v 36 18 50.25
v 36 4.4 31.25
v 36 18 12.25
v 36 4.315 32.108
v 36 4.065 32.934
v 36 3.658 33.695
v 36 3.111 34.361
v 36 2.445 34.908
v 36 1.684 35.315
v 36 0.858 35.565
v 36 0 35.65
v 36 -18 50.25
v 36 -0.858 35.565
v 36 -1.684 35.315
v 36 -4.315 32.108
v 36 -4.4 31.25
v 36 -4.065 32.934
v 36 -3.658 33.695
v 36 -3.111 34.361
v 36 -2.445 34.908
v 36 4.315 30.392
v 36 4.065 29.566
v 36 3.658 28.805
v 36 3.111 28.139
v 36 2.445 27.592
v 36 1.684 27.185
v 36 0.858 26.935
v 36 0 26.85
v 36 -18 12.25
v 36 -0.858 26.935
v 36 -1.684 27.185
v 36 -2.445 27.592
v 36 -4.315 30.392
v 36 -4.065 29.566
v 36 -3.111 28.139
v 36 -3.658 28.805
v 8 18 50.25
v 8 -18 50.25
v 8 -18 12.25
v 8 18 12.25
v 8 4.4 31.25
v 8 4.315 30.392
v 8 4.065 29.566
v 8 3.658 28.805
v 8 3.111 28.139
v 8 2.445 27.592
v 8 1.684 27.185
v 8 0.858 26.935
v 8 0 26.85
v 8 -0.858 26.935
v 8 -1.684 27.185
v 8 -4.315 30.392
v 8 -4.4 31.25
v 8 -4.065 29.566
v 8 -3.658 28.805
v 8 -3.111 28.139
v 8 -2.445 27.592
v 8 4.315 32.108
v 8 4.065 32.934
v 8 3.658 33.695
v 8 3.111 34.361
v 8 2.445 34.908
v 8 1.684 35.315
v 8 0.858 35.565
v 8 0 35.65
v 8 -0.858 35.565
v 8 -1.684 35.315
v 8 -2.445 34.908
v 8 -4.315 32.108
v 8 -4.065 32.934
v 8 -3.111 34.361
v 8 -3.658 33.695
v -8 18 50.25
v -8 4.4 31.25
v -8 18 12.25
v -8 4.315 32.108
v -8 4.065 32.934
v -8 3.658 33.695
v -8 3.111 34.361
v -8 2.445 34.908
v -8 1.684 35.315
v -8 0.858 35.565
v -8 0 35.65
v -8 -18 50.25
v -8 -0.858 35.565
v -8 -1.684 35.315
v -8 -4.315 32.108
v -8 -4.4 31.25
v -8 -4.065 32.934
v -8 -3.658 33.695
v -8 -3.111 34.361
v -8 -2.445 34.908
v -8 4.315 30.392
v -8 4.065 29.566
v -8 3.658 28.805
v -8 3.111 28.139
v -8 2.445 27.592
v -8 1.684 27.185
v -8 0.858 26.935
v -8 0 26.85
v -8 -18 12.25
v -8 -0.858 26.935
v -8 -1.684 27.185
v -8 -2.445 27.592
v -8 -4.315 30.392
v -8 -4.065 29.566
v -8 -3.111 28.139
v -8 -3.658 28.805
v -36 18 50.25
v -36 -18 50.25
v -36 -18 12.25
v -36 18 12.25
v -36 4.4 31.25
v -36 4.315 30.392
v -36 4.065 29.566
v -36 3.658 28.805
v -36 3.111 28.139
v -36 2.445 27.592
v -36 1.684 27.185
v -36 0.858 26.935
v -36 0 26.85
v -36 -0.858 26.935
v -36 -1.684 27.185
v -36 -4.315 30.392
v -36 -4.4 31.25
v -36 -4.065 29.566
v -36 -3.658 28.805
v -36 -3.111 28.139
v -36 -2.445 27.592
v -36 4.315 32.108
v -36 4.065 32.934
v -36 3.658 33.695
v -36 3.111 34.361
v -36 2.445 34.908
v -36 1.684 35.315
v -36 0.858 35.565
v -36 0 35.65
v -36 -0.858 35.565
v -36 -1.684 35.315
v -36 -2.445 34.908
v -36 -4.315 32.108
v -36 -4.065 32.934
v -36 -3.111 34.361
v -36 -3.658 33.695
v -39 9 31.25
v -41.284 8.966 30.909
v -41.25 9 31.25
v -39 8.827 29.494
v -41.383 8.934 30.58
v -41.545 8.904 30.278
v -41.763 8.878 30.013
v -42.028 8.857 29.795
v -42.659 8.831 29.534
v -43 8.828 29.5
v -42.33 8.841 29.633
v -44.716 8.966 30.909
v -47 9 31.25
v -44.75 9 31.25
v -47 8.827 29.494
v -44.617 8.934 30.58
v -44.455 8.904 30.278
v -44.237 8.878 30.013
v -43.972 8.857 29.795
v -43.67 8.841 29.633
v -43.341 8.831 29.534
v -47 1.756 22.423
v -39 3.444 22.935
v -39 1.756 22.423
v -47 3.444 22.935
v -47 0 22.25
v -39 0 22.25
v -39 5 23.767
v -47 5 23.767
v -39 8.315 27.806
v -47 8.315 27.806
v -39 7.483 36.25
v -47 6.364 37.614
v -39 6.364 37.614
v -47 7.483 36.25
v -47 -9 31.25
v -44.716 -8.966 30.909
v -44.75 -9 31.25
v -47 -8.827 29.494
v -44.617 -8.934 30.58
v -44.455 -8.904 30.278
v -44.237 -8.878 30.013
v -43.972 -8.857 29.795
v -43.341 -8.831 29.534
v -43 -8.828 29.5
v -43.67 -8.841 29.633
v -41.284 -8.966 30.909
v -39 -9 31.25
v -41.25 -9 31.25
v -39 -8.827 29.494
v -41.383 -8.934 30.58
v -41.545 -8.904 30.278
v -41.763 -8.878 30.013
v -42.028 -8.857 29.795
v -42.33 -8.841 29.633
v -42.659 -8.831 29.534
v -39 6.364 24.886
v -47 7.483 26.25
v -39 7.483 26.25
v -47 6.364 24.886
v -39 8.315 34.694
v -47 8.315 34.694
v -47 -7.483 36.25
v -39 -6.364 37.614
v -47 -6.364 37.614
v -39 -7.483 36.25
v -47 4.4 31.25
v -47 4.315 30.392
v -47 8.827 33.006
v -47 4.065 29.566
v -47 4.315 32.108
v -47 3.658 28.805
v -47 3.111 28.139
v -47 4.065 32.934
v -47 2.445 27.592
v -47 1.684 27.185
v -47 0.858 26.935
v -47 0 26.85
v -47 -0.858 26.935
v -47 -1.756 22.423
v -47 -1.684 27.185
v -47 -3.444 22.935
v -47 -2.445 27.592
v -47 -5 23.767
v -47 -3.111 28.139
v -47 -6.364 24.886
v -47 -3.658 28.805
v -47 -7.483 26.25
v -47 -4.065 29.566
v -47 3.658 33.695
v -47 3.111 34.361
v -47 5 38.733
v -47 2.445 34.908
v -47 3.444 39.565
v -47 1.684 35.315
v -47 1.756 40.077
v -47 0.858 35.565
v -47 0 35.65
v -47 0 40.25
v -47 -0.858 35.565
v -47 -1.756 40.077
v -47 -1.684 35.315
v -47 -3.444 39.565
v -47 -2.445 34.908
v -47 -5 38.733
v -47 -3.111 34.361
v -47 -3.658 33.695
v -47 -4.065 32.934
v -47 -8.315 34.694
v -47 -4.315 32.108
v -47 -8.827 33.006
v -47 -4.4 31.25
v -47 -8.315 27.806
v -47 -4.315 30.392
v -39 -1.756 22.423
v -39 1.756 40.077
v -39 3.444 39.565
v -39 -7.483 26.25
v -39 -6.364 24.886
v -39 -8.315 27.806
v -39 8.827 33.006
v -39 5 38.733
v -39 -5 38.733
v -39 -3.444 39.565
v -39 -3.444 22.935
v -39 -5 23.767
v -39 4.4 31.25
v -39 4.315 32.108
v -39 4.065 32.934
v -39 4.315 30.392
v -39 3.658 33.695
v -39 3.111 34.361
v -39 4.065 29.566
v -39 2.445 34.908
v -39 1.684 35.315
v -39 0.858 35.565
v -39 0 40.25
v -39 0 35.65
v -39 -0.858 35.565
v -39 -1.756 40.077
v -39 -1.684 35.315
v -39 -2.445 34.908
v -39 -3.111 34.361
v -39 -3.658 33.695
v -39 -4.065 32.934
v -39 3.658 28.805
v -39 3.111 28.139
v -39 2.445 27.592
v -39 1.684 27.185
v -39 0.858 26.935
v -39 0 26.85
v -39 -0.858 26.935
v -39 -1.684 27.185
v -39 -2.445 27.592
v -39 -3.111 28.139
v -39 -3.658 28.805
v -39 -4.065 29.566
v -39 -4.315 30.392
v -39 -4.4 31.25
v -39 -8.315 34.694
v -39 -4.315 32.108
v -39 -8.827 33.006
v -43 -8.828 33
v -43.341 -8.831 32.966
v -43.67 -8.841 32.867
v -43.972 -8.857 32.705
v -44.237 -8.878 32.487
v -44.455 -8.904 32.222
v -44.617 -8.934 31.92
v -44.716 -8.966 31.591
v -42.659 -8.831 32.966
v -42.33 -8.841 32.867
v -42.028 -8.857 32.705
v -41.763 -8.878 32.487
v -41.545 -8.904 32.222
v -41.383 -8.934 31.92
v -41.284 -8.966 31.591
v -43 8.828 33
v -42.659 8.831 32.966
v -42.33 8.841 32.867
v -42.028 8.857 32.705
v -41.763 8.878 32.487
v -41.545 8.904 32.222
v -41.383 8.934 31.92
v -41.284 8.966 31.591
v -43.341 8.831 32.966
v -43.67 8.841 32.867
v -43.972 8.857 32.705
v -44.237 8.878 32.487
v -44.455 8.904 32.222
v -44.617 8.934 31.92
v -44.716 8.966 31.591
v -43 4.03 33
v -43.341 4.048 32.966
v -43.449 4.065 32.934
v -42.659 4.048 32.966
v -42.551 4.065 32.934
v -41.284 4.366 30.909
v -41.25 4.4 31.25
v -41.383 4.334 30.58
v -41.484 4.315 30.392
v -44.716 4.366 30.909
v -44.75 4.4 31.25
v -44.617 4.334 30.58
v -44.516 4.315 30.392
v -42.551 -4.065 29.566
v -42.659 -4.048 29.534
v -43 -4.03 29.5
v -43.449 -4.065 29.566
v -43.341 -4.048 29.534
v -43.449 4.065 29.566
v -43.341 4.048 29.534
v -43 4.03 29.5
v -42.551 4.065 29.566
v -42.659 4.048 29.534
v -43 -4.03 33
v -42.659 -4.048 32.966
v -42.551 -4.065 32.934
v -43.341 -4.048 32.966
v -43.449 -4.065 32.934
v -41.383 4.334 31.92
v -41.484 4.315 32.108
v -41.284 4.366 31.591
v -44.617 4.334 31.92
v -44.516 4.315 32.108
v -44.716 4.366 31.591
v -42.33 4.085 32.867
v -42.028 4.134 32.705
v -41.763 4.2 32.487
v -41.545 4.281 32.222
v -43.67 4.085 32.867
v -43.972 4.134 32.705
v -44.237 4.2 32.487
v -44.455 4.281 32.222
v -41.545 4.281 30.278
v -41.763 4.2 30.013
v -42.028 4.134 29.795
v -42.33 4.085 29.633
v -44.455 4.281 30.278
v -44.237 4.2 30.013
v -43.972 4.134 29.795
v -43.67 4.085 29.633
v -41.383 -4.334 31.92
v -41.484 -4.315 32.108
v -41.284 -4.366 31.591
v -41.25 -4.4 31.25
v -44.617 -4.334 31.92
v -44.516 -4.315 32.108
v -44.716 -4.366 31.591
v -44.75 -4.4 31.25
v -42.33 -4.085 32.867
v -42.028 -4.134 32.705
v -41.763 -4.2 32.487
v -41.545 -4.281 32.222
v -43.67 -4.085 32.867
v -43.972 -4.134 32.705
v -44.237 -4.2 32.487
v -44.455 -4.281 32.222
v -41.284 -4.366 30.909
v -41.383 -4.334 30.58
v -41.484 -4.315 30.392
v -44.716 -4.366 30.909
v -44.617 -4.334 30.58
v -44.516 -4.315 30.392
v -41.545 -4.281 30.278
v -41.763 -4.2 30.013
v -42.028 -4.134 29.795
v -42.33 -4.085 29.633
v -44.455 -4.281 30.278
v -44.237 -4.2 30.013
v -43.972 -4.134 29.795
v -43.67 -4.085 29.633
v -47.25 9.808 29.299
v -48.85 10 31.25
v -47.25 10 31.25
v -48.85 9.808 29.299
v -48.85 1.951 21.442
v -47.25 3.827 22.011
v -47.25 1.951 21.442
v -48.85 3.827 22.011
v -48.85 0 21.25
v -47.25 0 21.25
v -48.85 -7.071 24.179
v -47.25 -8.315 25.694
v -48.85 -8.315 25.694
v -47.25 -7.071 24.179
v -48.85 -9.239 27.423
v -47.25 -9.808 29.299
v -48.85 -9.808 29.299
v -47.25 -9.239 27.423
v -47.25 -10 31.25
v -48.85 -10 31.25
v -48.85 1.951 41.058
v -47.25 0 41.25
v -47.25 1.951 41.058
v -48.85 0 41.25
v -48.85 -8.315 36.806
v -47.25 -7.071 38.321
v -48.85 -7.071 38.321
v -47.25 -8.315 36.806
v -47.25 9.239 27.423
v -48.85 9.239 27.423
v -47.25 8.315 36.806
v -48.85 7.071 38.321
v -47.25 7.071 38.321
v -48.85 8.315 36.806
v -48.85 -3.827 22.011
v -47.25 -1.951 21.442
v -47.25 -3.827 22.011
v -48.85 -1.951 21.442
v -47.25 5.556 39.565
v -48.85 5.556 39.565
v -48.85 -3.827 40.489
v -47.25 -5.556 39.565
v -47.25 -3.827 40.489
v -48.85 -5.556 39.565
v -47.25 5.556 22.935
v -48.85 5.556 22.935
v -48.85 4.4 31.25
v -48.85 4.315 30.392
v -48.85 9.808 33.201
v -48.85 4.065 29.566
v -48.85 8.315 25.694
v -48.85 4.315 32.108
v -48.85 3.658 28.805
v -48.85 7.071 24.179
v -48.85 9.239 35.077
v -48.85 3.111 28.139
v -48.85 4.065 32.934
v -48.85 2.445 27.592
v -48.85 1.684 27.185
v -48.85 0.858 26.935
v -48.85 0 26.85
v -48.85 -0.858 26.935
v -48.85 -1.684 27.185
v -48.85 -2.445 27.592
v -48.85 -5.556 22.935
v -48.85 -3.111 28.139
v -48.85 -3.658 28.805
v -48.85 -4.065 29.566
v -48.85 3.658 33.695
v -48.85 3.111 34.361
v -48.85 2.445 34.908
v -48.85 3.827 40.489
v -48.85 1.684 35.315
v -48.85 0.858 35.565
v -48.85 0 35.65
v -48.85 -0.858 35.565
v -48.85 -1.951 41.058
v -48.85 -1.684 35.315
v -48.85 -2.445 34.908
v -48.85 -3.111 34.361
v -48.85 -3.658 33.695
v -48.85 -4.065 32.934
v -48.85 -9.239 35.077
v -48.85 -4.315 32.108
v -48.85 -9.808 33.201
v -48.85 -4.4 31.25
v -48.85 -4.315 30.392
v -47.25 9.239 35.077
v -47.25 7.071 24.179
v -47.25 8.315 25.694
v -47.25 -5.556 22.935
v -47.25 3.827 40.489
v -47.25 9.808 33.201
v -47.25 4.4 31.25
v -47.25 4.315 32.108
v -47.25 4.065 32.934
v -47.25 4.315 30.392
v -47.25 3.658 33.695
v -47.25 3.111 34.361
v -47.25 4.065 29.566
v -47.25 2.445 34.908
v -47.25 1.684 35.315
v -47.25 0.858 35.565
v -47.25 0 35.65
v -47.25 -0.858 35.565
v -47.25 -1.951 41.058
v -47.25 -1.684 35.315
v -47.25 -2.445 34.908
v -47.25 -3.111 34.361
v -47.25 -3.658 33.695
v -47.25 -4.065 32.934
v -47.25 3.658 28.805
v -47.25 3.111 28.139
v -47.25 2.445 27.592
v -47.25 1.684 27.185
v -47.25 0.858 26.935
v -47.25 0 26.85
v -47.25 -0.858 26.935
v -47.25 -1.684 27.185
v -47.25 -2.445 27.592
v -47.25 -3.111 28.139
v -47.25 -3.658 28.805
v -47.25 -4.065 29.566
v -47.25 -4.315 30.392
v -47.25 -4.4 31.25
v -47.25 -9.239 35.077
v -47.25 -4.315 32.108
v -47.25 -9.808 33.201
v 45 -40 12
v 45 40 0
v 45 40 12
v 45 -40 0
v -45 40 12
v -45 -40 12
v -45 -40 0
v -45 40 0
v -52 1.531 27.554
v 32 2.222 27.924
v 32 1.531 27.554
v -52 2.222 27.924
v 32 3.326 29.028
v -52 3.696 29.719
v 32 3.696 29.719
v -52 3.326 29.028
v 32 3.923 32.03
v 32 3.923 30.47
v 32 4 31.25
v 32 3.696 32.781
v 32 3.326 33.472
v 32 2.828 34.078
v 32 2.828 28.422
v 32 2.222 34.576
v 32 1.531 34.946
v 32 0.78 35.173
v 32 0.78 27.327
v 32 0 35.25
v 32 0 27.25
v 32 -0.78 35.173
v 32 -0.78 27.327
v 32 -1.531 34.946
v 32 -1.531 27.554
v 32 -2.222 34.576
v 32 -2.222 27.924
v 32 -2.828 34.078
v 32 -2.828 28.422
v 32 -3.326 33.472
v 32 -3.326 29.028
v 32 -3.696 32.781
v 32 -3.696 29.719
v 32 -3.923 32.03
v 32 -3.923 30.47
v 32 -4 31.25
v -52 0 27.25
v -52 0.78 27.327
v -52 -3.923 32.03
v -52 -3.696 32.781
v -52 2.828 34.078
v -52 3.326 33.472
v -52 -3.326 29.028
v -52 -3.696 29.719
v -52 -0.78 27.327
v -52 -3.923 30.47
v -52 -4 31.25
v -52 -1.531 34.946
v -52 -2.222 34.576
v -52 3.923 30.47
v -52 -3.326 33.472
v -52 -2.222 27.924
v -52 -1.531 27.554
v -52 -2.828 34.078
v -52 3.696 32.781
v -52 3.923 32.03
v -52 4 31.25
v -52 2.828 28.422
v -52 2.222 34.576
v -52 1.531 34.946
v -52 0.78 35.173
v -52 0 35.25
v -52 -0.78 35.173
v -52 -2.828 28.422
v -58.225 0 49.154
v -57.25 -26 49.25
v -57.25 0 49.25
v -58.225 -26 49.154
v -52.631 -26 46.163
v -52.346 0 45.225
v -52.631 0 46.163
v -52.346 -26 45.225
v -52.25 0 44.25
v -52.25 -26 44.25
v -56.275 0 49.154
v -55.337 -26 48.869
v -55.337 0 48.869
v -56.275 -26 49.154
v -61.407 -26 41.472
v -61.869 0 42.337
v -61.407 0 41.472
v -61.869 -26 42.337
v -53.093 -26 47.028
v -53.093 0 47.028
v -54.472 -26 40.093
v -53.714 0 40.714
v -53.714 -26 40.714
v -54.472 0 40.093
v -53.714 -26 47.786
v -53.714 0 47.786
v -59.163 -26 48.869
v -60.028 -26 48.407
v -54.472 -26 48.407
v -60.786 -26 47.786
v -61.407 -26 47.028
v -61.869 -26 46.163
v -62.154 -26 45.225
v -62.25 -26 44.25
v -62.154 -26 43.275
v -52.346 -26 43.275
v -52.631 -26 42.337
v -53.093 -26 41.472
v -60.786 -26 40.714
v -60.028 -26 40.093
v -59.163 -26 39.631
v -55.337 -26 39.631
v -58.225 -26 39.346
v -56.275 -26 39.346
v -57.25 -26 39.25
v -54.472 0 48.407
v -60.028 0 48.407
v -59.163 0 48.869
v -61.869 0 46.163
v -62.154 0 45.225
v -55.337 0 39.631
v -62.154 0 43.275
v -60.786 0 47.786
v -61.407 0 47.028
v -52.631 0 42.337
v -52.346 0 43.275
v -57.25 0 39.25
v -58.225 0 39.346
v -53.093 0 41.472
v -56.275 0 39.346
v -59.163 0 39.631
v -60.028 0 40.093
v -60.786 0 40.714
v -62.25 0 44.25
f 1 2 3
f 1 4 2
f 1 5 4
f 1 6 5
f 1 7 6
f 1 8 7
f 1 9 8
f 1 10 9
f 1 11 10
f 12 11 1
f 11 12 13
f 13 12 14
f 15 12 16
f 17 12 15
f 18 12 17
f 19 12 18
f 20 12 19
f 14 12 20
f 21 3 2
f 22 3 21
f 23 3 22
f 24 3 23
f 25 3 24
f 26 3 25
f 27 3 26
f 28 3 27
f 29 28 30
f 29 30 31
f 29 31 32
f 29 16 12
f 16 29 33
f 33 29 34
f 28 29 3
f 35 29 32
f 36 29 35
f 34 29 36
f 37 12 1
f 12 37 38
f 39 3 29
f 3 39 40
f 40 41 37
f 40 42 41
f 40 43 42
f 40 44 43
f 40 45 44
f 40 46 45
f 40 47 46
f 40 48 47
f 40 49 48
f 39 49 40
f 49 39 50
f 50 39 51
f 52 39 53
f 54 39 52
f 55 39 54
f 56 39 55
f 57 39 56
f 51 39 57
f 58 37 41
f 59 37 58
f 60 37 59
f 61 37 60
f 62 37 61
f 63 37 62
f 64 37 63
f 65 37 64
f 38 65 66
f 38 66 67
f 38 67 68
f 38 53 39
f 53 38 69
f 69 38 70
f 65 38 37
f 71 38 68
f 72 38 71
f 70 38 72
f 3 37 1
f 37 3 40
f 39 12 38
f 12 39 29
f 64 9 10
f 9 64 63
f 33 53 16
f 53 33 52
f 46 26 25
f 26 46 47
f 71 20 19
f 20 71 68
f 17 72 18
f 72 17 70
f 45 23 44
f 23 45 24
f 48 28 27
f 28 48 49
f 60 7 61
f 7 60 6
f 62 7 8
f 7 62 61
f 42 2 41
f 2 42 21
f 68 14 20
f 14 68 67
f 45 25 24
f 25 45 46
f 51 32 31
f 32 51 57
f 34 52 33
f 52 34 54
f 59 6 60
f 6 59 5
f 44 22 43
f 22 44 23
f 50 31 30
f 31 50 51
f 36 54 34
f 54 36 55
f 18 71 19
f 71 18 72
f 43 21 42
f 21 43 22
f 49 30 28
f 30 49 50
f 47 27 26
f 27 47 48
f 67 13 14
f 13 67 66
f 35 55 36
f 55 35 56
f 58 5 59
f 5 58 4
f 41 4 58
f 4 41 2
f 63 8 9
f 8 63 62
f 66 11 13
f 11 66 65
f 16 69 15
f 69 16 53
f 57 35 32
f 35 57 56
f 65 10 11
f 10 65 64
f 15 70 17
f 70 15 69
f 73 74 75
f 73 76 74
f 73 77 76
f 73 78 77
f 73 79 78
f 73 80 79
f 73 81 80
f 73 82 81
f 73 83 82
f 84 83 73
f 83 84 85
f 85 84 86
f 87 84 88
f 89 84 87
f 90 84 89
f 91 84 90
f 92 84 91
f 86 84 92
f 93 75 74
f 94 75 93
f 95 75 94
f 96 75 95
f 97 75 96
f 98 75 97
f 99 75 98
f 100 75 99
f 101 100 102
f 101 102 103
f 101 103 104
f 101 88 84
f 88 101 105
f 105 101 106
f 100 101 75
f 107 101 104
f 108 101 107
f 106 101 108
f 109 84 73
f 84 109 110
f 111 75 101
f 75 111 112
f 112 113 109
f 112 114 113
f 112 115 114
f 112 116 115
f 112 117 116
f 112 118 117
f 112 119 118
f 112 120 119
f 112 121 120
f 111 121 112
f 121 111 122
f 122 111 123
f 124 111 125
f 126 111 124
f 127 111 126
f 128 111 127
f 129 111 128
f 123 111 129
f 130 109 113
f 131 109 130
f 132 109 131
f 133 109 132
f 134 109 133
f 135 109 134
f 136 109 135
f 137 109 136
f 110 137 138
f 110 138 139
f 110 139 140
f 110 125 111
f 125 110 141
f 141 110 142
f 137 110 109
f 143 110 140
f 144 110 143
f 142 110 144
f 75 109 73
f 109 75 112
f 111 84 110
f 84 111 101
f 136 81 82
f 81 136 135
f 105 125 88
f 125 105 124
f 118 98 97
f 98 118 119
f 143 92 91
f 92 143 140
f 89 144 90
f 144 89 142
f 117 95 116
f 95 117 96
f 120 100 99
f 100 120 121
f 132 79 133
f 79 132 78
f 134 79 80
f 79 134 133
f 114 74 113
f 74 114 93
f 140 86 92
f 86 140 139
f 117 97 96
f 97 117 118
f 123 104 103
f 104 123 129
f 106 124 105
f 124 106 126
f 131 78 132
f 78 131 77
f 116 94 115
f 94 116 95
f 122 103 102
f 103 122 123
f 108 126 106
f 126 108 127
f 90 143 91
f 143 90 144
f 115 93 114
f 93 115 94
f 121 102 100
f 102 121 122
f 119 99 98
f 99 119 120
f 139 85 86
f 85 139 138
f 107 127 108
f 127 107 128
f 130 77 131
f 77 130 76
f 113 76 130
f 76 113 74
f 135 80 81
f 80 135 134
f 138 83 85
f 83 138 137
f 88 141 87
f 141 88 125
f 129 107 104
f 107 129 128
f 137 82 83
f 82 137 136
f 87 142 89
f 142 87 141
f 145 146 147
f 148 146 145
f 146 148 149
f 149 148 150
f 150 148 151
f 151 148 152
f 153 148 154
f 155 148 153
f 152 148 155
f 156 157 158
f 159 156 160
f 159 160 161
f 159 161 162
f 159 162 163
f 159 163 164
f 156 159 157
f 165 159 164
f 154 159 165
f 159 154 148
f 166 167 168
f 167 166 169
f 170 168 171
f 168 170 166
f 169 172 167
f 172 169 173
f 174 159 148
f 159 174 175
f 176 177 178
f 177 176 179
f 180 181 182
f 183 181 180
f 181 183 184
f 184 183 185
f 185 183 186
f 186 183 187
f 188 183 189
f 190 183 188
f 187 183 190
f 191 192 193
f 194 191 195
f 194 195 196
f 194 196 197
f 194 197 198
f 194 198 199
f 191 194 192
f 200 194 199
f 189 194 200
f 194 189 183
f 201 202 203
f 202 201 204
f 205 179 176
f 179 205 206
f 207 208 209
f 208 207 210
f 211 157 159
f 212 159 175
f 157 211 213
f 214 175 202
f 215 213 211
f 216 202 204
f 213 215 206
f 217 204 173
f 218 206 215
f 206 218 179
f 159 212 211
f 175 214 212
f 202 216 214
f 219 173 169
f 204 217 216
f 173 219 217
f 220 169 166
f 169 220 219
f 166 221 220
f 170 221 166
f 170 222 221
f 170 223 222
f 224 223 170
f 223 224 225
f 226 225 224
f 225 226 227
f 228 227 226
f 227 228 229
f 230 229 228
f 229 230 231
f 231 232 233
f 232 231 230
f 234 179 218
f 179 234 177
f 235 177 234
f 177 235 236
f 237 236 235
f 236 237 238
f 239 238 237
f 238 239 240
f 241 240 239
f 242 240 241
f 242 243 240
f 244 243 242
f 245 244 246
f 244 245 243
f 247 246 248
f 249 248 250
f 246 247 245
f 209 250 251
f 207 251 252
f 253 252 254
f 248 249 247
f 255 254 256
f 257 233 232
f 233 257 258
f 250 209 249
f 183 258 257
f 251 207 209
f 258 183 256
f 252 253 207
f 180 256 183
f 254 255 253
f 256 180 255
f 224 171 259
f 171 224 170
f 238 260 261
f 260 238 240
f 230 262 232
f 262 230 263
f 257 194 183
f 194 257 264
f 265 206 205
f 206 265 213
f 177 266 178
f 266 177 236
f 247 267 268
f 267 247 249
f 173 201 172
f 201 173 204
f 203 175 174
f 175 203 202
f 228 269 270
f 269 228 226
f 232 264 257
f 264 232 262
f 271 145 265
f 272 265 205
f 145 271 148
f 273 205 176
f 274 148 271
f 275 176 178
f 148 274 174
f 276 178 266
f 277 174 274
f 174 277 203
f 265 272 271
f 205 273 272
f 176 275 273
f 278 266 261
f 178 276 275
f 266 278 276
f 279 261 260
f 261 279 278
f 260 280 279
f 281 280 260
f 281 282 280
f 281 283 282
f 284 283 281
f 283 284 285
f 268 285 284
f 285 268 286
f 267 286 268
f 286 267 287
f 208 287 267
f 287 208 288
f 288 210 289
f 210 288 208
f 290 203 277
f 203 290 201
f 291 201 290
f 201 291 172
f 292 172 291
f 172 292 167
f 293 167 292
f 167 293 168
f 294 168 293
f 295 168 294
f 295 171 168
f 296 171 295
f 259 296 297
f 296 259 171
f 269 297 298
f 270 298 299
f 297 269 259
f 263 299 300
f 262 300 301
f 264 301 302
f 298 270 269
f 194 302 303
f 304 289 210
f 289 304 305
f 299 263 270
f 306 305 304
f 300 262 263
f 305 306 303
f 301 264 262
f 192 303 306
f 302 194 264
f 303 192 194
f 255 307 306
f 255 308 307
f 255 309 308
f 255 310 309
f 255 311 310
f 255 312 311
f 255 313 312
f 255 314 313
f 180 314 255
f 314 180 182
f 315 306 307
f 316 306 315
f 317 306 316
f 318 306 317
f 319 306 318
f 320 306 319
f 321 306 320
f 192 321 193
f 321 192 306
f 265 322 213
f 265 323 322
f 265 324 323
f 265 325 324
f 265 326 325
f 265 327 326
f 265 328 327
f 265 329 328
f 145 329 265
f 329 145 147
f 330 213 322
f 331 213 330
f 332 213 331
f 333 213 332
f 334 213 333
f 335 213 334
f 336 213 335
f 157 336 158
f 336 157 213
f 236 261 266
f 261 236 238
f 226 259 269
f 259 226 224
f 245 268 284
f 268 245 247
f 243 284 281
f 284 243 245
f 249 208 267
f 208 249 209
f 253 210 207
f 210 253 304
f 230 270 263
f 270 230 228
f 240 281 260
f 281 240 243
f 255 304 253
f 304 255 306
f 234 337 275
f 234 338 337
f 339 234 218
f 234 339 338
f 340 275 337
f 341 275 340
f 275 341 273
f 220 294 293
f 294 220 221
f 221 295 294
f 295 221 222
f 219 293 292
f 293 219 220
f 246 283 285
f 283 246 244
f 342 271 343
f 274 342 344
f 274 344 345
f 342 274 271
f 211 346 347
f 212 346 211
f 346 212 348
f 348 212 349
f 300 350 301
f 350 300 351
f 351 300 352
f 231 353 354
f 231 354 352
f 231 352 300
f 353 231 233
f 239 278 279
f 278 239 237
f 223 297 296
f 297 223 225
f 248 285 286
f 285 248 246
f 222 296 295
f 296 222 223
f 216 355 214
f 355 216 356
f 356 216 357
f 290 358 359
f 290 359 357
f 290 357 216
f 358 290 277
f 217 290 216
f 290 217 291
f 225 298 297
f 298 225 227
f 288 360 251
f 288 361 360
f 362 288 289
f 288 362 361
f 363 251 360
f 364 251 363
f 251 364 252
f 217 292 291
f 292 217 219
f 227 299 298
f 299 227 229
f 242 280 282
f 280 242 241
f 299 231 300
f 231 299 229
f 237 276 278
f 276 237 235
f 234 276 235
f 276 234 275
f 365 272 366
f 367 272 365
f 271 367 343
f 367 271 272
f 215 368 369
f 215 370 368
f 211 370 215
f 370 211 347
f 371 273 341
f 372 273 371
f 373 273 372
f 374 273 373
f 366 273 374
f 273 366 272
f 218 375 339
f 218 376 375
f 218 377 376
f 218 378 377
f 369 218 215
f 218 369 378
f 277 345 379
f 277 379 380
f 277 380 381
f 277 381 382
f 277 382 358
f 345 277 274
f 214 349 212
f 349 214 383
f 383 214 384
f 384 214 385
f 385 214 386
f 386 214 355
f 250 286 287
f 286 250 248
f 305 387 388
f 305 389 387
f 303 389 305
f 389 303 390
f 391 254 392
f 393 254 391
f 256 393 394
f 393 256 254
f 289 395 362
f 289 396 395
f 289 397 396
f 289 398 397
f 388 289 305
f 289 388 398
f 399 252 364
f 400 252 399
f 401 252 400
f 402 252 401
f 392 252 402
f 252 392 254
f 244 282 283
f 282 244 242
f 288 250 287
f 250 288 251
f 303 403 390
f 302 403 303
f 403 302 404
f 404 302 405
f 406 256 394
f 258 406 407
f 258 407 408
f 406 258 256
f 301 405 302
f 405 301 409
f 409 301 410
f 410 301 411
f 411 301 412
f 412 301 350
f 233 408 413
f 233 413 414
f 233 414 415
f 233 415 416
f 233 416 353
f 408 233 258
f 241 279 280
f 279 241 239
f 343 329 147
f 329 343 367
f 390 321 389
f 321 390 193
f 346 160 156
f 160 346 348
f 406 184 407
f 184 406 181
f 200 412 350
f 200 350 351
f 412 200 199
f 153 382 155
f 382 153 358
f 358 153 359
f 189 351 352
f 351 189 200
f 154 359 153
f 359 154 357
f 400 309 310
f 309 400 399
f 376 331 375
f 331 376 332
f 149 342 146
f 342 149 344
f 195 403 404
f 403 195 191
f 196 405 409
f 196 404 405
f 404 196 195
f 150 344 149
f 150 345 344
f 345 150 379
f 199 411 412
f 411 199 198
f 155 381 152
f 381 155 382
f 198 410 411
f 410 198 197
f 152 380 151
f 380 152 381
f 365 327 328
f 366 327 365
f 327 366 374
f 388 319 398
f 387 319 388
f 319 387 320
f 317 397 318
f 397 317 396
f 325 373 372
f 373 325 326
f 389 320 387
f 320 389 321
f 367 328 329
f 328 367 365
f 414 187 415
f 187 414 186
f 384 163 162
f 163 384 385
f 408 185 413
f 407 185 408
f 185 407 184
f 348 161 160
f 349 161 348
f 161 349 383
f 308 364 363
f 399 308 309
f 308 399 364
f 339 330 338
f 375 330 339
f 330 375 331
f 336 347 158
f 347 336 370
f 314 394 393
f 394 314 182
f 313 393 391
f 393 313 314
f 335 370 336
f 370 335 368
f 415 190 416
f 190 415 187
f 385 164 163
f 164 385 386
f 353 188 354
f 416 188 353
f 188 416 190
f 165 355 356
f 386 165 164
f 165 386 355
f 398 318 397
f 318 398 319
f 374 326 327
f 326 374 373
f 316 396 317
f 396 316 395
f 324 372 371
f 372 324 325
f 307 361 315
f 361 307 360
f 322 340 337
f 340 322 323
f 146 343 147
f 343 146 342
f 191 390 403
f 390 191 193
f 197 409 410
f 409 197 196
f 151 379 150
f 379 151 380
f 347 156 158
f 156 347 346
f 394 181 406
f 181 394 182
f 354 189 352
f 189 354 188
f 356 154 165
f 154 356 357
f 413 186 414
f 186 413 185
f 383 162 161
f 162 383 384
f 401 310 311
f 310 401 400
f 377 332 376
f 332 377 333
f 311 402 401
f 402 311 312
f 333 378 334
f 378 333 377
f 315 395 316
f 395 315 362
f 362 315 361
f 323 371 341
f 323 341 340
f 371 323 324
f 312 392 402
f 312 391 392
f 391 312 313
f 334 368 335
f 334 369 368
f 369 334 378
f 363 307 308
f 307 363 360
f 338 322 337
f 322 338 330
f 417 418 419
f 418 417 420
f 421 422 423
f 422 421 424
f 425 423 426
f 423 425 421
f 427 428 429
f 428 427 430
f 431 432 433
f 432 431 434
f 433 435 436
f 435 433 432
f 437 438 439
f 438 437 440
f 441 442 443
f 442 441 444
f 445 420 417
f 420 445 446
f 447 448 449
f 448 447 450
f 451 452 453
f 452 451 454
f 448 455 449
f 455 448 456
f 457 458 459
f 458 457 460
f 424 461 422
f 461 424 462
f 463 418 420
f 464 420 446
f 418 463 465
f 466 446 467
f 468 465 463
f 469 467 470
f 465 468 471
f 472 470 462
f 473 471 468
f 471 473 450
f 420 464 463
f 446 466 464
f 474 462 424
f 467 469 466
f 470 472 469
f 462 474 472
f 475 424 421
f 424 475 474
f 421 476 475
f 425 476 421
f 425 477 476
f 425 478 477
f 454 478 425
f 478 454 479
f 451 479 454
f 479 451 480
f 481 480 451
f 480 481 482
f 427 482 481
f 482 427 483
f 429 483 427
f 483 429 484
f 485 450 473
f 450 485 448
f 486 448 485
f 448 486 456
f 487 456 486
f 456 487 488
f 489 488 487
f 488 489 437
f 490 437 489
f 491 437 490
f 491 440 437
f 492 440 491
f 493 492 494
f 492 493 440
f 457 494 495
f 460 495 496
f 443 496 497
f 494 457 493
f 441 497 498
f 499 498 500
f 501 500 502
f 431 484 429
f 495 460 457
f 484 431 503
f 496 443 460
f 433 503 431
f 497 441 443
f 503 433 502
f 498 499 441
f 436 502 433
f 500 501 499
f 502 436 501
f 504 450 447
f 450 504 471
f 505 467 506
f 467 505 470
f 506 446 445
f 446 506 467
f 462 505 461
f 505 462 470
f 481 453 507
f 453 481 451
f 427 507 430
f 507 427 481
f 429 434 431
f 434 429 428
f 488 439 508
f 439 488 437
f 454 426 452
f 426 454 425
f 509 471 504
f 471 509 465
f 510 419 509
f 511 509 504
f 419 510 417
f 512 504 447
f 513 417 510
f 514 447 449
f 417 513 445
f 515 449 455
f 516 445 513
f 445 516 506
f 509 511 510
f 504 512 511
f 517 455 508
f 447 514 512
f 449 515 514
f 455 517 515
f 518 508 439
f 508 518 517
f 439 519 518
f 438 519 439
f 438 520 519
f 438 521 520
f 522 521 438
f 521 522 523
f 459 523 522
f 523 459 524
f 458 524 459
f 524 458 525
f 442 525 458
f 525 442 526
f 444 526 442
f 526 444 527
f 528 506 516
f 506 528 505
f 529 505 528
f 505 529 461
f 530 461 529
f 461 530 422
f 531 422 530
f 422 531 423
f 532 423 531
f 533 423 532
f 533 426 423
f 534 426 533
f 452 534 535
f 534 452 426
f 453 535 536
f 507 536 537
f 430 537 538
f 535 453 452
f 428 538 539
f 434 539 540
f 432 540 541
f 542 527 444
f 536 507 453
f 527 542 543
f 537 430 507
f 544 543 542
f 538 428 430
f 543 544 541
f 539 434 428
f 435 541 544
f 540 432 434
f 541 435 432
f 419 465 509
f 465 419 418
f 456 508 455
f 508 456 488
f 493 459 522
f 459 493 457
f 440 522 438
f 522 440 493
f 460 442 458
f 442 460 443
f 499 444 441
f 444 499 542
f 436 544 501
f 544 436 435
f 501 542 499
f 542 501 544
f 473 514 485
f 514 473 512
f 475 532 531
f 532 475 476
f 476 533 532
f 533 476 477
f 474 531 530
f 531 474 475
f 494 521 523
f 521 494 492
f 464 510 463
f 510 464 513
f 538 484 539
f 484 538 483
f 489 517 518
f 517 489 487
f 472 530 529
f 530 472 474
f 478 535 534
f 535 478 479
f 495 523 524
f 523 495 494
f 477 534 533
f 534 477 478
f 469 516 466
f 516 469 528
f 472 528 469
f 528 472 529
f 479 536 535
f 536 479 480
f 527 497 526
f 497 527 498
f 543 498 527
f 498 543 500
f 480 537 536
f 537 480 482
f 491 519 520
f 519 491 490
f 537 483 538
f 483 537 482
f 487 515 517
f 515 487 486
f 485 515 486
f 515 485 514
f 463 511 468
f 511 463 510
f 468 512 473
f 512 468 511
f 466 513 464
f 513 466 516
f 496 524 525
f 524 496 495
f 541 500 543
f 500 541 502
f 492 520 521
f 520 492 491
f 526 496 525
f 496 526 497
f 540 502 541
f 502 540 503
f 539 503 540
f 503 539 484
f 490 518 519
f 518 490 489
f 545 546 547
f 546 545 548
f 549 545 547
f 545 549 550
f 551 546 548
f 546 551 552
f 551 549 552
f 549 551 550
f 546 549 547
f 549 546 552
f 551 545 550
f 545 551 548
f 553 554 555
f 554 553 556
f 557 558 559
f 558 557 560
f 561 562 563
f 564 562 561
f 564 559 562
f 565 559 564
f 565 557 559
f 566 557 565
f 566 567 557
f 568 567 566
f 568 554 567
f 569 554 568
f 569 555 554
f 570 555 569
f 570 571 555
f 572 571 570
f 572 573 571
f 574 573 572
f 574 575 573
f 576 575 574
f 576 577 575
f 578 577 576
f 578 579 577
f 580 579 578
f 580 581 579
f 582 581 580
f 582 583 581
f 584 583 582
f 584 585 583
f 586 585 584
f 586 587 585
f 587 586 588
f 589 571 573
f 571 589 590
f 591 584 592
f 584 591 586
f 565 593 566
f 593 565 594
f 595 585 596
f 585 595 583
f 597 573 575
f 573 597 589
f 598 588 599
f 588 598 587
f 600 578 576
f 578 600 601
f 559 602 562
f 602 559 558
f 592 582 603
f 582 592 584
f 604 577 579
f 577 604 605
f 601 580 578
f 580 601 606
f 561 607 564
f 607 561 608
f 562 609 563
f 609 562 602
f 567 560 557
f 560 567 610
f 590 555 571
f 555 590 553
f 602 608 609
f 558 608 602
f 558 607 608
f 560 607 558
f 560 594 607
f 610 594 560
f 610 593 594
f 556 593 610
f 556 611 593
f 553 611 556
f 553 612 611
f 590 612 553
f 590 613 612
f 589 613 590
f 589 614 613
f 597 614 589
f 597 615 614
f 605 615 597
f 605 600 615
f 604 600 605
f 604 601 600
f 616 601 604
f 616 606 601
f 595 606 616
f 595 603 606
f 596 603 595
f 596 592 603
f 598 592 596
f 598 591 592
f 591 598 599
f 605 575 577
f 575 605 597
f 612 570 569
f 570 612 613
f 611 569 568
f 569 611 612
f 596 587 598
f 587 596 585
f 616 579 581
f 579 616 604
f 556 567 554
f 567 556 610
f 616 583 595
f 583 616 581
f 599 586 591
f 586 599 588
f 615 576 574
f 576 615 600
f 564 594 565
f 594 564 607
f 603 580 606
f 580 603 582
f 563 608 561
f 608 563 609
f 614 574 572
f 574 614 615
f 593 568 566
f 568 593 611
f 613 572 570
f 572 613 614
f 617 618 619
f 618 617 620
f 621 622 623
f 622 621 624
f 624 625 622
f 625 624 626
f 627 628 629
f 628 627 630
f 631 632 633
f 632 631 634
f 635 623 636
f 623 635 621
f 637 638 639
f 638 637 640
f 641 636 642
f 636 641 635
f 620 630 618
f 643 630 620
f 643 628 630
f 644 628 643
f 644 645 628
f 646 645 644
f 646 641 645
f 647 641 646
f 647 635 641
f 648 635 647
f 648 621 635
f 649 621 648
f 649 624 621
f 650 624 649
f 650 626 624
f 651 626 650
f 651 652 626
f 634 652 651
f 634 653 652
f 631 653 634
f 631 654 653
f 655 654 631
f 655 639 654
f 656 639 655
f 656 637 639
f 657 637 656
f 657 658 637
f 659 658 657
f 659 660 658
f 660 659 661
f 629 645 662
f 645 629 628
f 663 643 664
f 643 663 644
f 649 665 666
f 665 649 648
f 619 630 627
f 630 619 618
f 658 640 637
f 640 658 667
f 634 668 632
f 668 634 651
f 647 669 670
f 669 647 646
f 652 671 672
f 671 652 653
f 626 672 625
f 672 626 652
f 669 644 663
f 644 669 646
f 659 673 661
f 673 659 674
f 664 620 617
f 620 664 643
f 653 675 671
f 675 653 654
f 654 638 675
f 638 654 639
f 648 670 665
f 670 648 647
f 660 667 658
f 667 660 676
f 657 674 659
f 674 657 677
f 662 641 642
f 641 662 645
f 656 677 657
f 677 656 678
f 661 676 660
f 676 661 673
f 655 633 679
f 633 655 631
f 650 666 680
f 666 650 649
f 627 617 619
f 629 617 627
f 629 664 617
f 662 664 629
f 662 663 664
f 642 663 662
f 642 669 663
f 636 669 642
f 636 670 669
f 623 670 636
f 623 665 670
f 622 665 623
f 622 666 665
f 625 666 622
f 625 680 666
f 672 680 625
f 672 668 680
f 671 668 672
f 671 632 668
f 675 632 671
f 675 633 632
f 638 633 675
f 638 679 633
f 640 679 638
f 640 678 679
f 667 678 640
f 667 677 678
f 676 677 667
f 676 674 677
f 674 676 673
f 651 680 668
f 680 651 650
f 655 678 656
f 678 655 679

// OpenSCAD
$fn = 32;

// ------------------------------------------------------------------------
// Machine vise: screw d8, jaws 28 x 38 mm
// Every part is its own module, assembly() places every instance.
// ------------------------------------------------------------------------

// --- part 1 ---
module vise_bed() {
  difference() {
    translate([-45, -40, 0]) cube([90, 80, 12]);
  }
}

// --- part 2 ---
module vise_jaw() {
  difference() {
    translate([-14, -18, 0]) cube([28, 36, 38]);
    translate([0, 0, 19]) rotate([0, 90, 0]) cylinder(h = 30, d = 8.8, center = true);
  }
}

// --- part 3 ---
module vise_screw() {
  translate([0, 0, -42]) cylinder(h = 84, d = 8);
}

// --- part 4 ---
module screw_collar() {
  difference() {
    cylinder(h = 8, d = 18);
    translate([0, 0, -1]) cylinder(h = 10, d = 8.8);
    translate([0, 0, 4]) rotate([90, 0, 0]) cylinder(h = 20, d = 3.5, center = true);
  }
}

// --- part 5 ---
module screw_washer() {
  difference() {
      translate([0, 0, 0]) cylinder(h = 1.6, d = 20);
      translate([0, 0, -1]) cylinder(h = 3.6, d = 8.8);
    }
}

// --- part 6 ---
module vise_handle() {
  cylinder(h = 26, d = 10);
}

// --- assembly ---
module assembly() {
  color([0.80, 0.24, 0.20]) translate([0, 0, 0]) rotate([0, 0, 0]) vise_bed();
  color([0.20, 0.45, 0.75]) translate([22, 0, 12.25]) rotate([0, 0, 0]) vise_jaw();
  color([0.25, 0.62, 0.32]) translate([-22, 0, 12.25]) rotate([0, 0, 0]) vise_jaw();
  color([0.92, 0.70, 0.18]) translate([-10, 0, 31.25]) rotate([0, 90, 0]) vise_screw();
  color([0.58, 0.35, 0.70]) translate([-47, 0, 31.25]) rotate([0, 90, 0]) screw_collar();
  color([0.16, 0.66, 0.66]) translate([-48.85, 0, 31.25]) rotate([0, 90, 0]) screw_washer();
  color([0.85, 0.48, 0.18]) translate([-57.25, 0, 44.25]) rotate([90, 0, 0]) vise_handle();
}

assembly();
